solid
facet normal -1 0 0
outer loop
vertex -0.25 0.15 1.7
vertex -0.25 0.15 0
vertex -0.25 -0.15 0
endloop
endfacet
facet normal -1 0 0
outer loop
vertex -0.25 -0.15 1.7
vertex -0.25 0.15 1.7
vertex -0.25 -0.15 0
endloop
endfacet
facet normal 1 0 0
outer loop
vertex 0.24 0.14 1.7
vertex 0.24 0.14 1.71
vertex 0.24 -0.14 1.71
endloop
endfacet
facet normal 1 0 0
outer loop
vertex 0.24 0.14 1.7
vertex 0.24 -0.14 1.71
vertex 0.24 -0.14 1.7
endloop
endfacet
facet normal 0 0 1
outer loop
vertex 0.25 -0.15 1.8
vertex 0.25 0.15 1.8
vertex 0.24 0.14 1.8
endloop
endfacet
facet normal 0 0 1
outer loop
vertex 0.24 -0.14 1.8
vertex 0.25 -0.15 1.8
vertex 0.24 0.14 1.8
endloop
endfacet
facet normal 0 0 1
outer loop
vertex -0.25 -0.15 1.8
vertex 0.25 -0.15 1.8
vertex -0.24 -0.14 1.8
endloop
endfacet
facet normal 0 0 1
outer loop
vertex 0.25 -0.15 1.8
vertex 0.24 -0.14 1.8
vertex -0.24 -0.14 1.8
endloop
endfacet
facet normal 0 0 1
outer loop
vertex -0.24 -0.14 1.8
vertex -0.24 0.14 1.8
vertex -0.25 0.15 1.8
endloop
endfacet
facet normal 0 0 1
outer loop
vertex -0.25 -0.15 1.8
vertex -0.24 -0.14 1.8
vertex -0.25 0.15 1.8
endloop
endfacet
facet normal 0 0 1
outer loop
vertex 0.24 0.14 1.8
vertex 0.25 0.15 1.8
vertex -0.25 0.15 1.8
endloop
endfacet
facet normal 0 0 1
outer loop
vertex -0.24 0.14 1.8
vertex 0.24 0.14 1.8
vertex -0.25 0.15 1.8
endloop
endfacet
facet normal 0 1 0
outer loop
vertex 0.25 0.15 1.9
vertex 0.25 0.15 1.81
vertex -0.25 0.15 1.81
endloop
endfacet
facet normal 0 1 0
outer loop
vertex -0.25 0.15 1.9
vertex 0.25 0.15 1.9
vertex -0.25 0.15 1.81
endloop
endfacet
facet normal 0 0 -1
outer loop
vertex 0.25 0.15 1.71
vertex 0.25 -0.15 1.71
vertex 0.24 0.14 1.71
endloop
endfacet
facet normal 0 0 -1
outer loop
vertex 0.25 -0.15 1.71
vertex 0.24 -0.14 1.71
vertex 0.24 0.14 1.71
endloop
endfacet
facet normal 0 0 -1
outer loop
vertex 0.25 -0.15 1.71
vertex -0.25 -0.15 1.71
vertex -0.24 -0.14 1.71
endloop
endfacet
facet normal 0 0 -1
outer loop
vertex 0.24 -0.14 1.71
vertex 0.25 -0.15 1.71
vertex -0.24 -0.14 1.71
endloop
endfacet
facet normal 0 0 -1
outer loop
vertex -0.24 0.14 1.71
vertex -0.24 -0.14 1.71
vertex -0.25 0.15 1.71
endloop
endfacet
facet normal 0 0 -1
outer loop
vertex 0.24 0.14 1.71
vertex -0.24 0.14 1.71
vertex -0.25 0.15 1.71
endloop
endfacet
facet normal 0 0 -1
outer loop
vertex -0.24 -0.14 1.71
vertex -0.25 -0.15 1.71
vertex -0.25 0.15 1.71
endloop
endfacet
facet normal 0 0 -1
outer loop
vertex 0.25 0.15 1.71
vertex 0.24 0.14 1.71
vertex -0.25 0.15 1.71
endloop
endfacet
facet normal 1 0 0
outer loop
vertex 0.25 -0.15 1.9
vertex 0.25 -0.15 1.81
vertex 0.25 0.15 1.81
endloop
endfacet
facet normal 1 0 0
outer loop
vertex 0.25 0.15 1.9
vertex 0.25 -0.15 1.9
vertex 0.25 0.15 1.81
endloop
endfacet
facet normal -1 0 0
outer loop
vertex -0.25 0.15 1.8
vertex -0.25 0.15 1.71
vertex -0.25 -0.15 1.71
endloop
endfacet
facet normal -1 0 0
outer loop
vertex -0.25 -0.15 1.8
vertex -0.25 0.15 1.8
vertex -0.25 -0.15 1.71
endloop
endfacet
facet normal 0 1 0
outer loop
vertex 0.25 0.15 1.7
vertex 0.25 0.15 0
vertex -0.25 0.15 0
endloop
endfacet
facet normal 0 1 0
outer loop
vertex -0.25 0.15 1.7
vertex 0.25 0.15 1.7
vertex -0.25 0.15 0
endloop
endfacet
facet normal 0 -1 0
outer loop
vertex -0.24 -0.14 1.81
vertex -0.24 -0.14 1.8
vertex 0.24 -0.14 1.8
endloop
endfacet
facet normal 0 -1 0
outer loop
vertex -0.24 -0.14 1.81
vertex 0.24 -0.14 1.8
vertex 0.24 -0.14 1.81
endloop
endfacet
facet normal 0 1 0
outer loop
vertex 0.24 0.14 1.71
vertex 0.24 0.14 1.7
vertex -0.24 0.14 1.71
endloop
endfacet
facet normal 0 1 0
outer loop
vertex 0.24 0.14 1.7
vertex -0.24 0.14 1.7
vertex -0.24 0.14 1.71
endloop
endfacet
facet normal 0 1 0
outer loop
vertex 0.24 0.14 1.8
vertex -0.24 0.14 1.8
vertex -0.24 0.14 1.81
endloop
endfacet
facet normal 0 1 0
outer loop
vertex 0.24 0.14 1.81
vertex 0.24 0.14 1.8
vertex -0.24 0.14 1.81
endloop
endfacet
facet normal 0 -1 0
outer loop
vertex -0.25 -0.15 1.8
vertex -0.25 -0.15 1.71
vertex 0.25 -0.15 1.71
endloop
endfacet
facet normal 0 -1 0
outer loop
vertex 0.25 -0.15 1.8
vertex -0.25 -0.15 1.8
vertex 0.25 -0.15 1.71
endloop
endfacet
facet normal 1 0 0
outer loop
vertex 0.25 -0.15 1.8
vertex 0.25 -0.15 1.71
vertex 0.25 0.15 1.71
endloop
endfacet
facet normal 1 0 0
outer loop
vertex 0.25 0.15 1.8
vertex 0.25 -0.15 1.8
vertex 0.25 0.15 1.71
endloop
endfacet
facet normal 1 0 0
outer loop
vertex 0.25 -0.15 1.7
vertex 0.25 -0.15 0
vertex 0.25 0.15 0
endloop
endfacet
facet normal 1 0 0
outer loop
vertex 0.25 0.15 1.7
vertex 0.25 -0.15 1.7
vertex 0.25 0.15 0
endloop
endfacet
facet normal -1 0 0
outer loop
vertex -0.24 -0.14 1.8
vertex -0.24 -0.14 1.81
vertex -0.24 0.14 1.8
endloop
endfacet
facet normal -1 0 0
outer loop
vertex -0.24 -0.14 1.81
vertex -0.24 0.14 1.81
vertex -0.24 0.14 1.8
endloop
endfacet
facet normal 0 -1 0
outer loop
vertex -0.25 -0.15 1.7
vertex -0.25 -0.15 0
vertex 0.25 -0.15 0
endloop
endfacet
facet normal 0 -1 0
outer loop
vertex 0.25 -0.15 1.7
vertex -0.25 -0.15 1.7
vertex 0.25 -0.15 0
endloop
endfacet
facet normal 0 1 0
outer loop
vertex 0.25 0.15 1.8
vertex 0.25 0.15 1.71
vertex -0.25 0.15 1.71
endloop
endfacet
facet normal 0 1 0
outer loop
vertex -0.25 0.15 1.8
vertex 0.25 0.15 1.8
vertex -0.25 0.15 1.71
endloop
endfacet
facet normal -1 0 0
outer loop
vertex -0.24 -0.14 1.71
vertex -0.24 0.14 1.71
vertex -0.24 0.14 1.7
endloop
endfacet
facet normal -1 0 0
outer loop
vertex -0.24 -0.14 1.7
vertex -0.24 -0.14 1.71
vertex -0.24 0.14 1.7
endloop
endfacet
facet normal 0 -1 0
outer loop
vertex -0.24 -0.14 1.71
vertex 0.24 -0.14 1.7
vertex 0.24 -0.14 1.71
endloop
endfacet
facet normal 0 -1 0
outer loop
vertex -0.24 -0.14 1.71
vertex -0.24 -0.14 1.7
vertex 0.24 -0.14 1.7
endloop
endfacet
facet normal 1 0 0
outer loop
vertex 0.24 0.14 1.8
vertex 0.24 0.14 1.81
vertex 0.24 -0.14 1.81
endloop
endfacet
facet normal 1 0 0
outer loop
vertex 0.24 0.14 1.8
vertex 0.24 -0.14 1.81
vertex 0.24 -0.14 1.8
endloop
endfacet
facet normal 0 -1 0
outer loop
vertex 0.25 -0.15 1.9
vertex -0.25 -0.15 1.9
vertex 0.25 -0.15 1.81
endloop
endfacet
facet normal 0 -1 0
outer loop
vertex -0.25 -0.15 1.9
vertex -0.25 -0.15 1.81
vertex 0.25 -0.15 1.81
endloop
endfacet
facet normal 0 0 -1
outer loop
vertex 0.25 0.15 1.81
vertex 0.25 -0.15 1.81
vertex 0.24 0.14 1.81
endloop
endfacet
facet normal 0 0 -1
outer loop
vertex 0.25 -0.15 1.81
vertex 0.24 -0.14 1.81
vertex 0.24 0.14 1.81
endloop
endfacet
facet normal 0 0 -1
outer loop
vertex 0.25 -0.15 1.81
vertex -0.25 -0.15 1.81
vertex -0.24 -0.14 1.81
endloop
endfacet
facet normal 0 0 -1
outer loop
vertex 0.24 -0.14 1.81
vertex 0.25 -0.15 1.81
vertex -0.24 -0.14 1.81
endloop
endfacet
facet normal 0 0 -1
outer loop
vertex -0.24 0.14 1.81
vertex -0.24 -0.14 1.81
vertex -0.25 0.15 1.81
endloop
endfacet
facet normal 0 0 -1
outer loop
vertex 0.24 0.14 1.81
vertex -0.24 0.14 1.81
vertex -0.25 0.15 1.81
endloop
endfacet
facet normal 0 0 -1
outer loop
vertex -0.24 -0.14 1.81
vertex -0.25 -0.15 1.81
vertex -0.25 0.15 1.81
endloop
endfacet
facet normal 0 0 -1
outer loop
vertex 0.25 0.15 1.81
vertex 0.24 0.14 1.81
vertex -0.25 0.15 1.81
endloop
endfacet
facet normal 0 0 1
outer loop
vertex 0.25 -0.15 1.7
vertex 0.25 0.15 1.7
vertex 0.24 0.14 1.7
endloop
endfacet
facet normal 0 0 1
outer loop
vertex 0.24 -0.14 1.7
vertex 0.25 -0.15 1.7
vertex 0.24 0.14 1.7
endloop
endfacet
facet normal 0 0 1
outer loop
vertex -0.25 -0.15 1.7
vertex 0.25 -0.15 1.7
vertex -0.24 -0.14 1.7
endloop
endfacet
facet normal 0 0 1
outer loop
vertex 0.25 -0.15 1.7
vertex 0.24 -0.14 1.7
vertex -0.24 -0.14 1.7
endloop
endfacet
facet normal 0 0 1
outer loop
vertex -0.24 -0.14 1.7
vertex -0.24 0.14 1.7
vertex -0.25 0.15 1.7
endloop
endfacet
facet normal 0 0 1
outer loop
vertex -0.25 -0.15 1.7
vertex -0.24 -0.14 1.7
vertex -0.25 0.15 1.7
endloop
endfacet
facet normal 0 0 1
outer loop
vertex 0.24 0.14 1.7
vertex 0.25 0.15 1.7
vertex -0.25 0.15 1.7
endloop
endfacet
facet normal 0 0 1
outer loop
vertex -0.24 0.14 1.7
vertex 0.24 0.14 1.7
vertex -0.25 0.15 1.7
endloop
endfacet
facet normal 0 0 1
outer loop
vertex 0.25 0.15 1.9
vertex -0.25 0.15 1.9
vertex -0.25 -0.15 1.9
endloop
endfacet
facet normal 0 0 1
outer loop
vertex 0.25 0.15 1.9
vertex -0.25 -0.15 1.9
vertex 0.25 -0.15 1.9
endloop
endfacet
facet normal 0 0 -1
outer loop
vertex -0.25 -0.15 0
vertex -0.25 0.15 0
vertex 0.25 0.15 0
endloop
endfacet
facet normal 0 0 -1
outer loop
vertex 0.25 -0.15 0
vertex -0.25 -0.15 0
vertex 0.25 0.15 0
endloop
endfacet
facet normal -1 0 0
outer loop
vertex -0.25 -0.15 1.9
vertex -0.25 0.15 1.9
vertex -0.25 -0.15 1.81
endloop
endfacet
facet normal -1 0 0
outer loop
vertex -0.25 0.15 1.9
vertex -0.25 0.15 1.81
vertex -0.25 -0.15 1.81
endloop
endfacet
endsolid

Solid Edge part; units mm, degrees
sketch "Sketch1" plane through (0, 0, 0) normal (0, 0, 1) x (1, 0, 0)
  line L0 (-0.25, -0.15) -> (0.25, -0.15)
  line L1 (0.25, -0.15) -> (0.25, 0.15)
  line L2 (0.25, 0.15) -> (-0.25, 0.15)
  line L3 (-0.25, 0.15) -> (-0.25, -0.15)
  dimension "D1" = 0.5
  dimension "D2" = 0.3
extrude "Protrusion1" add sketch "Sketch1" along normal blind 1.9
sketch "Sketch2" plane through (0, 0.15, 0.95) normal (0, 1, 0) x (-1, 0, 0)
  line L0 (-0.25, 0.76) -> (-0.25, 0.75)
  line L1 (-0.25, 0.75) -> (-0.24, 0.75)
  line L2 (-0.24, 0.76) -> (-0.24, 0.75)
  line L3 (-0.24, 0.76) -> (-0.25, 0.76)
  line L4 (-0.25, 0.85) -> (-0.24, 0.85)
  line L5 (-0.24, 0.86) -> (-0.24, 0.85)
  line L6 (-0.24, 0.86) -> (-0.25, 0.86)
  line L7 (-0.25, 0.86) -> (-0.25, 0.85)
  line L8 (0.25, 0.76) -> (0.24, 0.76)
  line L9 (0.24, 0.76) -> (0.24, 0.75)
  line L10 (0.24, 0.75) -> (0.25, 0.75)
  line L11 (0.25, 0.76) -> (0.25, 0.75)
  line L12 (0.25, 0.86) -> (0.25, 0.85)
  line L13 (0.24, 0.85) -> (0.25, 0.85)
  line L14 (0.24, 0.86) -> (0.24, 0.85)
  line L15 (0.25, 0.86) -> (0.24, 0.86)
  dimension "D1" = 0.01
  dimension "D2" = 0.01
  dimension "D3" = 1.7
  dimension "D4" = 0.1
extrude "Cutout1" cut sketch "Sketch2" against normal through all
sketch "Sketch3" plane through (-0.25, 0, 0.85) normal (-1, 0, 0) x (0, 0, 1)
  line L0 (0.86, 0.15) -> (0.85, 0.15)
  line L1 (0.85, 0.14) -> (0.85, 0.15)
  line L2 (0.85, 0.14) -> (0.86, 0.14)
  line L3 (0.86, 0.14) -> (0.86, 0.15)
  line L4 (0.95, 0.15) -> (0.96, 0.15)
  line L5 (0.96, 0.14) -> (0.96, 0.15)
  line L6 (0.95, 0.14) -> (0.96, 0.14)
  line L7 (0.95, 0.14) -> (0.95, 0.15)
  line L8 (0.95, -0.15) -> (0.95, -0.14)
  line L9 (0.95, -0.14) -> (0.96, -0.14)
  line L10 (0.96, -0.15) -> (0.96, -0.14)
  line L11 (0.95, -0.15) -> (0.96, -0.15)
  line L12 (0.85, -0.15) -> (0.85, -0.14)
  line L13 (0.85, -0.14) -> (0.86, -0.14)
  line L14 (0.86, -0.15) -> (0.86, -0.14)
  line L15 (0.85, -0.15) -> (0.86, -0.15)
  dimension "D1" = 0.01
extrude "Cutout2" cut sketch "Sketch3" against normal through all
